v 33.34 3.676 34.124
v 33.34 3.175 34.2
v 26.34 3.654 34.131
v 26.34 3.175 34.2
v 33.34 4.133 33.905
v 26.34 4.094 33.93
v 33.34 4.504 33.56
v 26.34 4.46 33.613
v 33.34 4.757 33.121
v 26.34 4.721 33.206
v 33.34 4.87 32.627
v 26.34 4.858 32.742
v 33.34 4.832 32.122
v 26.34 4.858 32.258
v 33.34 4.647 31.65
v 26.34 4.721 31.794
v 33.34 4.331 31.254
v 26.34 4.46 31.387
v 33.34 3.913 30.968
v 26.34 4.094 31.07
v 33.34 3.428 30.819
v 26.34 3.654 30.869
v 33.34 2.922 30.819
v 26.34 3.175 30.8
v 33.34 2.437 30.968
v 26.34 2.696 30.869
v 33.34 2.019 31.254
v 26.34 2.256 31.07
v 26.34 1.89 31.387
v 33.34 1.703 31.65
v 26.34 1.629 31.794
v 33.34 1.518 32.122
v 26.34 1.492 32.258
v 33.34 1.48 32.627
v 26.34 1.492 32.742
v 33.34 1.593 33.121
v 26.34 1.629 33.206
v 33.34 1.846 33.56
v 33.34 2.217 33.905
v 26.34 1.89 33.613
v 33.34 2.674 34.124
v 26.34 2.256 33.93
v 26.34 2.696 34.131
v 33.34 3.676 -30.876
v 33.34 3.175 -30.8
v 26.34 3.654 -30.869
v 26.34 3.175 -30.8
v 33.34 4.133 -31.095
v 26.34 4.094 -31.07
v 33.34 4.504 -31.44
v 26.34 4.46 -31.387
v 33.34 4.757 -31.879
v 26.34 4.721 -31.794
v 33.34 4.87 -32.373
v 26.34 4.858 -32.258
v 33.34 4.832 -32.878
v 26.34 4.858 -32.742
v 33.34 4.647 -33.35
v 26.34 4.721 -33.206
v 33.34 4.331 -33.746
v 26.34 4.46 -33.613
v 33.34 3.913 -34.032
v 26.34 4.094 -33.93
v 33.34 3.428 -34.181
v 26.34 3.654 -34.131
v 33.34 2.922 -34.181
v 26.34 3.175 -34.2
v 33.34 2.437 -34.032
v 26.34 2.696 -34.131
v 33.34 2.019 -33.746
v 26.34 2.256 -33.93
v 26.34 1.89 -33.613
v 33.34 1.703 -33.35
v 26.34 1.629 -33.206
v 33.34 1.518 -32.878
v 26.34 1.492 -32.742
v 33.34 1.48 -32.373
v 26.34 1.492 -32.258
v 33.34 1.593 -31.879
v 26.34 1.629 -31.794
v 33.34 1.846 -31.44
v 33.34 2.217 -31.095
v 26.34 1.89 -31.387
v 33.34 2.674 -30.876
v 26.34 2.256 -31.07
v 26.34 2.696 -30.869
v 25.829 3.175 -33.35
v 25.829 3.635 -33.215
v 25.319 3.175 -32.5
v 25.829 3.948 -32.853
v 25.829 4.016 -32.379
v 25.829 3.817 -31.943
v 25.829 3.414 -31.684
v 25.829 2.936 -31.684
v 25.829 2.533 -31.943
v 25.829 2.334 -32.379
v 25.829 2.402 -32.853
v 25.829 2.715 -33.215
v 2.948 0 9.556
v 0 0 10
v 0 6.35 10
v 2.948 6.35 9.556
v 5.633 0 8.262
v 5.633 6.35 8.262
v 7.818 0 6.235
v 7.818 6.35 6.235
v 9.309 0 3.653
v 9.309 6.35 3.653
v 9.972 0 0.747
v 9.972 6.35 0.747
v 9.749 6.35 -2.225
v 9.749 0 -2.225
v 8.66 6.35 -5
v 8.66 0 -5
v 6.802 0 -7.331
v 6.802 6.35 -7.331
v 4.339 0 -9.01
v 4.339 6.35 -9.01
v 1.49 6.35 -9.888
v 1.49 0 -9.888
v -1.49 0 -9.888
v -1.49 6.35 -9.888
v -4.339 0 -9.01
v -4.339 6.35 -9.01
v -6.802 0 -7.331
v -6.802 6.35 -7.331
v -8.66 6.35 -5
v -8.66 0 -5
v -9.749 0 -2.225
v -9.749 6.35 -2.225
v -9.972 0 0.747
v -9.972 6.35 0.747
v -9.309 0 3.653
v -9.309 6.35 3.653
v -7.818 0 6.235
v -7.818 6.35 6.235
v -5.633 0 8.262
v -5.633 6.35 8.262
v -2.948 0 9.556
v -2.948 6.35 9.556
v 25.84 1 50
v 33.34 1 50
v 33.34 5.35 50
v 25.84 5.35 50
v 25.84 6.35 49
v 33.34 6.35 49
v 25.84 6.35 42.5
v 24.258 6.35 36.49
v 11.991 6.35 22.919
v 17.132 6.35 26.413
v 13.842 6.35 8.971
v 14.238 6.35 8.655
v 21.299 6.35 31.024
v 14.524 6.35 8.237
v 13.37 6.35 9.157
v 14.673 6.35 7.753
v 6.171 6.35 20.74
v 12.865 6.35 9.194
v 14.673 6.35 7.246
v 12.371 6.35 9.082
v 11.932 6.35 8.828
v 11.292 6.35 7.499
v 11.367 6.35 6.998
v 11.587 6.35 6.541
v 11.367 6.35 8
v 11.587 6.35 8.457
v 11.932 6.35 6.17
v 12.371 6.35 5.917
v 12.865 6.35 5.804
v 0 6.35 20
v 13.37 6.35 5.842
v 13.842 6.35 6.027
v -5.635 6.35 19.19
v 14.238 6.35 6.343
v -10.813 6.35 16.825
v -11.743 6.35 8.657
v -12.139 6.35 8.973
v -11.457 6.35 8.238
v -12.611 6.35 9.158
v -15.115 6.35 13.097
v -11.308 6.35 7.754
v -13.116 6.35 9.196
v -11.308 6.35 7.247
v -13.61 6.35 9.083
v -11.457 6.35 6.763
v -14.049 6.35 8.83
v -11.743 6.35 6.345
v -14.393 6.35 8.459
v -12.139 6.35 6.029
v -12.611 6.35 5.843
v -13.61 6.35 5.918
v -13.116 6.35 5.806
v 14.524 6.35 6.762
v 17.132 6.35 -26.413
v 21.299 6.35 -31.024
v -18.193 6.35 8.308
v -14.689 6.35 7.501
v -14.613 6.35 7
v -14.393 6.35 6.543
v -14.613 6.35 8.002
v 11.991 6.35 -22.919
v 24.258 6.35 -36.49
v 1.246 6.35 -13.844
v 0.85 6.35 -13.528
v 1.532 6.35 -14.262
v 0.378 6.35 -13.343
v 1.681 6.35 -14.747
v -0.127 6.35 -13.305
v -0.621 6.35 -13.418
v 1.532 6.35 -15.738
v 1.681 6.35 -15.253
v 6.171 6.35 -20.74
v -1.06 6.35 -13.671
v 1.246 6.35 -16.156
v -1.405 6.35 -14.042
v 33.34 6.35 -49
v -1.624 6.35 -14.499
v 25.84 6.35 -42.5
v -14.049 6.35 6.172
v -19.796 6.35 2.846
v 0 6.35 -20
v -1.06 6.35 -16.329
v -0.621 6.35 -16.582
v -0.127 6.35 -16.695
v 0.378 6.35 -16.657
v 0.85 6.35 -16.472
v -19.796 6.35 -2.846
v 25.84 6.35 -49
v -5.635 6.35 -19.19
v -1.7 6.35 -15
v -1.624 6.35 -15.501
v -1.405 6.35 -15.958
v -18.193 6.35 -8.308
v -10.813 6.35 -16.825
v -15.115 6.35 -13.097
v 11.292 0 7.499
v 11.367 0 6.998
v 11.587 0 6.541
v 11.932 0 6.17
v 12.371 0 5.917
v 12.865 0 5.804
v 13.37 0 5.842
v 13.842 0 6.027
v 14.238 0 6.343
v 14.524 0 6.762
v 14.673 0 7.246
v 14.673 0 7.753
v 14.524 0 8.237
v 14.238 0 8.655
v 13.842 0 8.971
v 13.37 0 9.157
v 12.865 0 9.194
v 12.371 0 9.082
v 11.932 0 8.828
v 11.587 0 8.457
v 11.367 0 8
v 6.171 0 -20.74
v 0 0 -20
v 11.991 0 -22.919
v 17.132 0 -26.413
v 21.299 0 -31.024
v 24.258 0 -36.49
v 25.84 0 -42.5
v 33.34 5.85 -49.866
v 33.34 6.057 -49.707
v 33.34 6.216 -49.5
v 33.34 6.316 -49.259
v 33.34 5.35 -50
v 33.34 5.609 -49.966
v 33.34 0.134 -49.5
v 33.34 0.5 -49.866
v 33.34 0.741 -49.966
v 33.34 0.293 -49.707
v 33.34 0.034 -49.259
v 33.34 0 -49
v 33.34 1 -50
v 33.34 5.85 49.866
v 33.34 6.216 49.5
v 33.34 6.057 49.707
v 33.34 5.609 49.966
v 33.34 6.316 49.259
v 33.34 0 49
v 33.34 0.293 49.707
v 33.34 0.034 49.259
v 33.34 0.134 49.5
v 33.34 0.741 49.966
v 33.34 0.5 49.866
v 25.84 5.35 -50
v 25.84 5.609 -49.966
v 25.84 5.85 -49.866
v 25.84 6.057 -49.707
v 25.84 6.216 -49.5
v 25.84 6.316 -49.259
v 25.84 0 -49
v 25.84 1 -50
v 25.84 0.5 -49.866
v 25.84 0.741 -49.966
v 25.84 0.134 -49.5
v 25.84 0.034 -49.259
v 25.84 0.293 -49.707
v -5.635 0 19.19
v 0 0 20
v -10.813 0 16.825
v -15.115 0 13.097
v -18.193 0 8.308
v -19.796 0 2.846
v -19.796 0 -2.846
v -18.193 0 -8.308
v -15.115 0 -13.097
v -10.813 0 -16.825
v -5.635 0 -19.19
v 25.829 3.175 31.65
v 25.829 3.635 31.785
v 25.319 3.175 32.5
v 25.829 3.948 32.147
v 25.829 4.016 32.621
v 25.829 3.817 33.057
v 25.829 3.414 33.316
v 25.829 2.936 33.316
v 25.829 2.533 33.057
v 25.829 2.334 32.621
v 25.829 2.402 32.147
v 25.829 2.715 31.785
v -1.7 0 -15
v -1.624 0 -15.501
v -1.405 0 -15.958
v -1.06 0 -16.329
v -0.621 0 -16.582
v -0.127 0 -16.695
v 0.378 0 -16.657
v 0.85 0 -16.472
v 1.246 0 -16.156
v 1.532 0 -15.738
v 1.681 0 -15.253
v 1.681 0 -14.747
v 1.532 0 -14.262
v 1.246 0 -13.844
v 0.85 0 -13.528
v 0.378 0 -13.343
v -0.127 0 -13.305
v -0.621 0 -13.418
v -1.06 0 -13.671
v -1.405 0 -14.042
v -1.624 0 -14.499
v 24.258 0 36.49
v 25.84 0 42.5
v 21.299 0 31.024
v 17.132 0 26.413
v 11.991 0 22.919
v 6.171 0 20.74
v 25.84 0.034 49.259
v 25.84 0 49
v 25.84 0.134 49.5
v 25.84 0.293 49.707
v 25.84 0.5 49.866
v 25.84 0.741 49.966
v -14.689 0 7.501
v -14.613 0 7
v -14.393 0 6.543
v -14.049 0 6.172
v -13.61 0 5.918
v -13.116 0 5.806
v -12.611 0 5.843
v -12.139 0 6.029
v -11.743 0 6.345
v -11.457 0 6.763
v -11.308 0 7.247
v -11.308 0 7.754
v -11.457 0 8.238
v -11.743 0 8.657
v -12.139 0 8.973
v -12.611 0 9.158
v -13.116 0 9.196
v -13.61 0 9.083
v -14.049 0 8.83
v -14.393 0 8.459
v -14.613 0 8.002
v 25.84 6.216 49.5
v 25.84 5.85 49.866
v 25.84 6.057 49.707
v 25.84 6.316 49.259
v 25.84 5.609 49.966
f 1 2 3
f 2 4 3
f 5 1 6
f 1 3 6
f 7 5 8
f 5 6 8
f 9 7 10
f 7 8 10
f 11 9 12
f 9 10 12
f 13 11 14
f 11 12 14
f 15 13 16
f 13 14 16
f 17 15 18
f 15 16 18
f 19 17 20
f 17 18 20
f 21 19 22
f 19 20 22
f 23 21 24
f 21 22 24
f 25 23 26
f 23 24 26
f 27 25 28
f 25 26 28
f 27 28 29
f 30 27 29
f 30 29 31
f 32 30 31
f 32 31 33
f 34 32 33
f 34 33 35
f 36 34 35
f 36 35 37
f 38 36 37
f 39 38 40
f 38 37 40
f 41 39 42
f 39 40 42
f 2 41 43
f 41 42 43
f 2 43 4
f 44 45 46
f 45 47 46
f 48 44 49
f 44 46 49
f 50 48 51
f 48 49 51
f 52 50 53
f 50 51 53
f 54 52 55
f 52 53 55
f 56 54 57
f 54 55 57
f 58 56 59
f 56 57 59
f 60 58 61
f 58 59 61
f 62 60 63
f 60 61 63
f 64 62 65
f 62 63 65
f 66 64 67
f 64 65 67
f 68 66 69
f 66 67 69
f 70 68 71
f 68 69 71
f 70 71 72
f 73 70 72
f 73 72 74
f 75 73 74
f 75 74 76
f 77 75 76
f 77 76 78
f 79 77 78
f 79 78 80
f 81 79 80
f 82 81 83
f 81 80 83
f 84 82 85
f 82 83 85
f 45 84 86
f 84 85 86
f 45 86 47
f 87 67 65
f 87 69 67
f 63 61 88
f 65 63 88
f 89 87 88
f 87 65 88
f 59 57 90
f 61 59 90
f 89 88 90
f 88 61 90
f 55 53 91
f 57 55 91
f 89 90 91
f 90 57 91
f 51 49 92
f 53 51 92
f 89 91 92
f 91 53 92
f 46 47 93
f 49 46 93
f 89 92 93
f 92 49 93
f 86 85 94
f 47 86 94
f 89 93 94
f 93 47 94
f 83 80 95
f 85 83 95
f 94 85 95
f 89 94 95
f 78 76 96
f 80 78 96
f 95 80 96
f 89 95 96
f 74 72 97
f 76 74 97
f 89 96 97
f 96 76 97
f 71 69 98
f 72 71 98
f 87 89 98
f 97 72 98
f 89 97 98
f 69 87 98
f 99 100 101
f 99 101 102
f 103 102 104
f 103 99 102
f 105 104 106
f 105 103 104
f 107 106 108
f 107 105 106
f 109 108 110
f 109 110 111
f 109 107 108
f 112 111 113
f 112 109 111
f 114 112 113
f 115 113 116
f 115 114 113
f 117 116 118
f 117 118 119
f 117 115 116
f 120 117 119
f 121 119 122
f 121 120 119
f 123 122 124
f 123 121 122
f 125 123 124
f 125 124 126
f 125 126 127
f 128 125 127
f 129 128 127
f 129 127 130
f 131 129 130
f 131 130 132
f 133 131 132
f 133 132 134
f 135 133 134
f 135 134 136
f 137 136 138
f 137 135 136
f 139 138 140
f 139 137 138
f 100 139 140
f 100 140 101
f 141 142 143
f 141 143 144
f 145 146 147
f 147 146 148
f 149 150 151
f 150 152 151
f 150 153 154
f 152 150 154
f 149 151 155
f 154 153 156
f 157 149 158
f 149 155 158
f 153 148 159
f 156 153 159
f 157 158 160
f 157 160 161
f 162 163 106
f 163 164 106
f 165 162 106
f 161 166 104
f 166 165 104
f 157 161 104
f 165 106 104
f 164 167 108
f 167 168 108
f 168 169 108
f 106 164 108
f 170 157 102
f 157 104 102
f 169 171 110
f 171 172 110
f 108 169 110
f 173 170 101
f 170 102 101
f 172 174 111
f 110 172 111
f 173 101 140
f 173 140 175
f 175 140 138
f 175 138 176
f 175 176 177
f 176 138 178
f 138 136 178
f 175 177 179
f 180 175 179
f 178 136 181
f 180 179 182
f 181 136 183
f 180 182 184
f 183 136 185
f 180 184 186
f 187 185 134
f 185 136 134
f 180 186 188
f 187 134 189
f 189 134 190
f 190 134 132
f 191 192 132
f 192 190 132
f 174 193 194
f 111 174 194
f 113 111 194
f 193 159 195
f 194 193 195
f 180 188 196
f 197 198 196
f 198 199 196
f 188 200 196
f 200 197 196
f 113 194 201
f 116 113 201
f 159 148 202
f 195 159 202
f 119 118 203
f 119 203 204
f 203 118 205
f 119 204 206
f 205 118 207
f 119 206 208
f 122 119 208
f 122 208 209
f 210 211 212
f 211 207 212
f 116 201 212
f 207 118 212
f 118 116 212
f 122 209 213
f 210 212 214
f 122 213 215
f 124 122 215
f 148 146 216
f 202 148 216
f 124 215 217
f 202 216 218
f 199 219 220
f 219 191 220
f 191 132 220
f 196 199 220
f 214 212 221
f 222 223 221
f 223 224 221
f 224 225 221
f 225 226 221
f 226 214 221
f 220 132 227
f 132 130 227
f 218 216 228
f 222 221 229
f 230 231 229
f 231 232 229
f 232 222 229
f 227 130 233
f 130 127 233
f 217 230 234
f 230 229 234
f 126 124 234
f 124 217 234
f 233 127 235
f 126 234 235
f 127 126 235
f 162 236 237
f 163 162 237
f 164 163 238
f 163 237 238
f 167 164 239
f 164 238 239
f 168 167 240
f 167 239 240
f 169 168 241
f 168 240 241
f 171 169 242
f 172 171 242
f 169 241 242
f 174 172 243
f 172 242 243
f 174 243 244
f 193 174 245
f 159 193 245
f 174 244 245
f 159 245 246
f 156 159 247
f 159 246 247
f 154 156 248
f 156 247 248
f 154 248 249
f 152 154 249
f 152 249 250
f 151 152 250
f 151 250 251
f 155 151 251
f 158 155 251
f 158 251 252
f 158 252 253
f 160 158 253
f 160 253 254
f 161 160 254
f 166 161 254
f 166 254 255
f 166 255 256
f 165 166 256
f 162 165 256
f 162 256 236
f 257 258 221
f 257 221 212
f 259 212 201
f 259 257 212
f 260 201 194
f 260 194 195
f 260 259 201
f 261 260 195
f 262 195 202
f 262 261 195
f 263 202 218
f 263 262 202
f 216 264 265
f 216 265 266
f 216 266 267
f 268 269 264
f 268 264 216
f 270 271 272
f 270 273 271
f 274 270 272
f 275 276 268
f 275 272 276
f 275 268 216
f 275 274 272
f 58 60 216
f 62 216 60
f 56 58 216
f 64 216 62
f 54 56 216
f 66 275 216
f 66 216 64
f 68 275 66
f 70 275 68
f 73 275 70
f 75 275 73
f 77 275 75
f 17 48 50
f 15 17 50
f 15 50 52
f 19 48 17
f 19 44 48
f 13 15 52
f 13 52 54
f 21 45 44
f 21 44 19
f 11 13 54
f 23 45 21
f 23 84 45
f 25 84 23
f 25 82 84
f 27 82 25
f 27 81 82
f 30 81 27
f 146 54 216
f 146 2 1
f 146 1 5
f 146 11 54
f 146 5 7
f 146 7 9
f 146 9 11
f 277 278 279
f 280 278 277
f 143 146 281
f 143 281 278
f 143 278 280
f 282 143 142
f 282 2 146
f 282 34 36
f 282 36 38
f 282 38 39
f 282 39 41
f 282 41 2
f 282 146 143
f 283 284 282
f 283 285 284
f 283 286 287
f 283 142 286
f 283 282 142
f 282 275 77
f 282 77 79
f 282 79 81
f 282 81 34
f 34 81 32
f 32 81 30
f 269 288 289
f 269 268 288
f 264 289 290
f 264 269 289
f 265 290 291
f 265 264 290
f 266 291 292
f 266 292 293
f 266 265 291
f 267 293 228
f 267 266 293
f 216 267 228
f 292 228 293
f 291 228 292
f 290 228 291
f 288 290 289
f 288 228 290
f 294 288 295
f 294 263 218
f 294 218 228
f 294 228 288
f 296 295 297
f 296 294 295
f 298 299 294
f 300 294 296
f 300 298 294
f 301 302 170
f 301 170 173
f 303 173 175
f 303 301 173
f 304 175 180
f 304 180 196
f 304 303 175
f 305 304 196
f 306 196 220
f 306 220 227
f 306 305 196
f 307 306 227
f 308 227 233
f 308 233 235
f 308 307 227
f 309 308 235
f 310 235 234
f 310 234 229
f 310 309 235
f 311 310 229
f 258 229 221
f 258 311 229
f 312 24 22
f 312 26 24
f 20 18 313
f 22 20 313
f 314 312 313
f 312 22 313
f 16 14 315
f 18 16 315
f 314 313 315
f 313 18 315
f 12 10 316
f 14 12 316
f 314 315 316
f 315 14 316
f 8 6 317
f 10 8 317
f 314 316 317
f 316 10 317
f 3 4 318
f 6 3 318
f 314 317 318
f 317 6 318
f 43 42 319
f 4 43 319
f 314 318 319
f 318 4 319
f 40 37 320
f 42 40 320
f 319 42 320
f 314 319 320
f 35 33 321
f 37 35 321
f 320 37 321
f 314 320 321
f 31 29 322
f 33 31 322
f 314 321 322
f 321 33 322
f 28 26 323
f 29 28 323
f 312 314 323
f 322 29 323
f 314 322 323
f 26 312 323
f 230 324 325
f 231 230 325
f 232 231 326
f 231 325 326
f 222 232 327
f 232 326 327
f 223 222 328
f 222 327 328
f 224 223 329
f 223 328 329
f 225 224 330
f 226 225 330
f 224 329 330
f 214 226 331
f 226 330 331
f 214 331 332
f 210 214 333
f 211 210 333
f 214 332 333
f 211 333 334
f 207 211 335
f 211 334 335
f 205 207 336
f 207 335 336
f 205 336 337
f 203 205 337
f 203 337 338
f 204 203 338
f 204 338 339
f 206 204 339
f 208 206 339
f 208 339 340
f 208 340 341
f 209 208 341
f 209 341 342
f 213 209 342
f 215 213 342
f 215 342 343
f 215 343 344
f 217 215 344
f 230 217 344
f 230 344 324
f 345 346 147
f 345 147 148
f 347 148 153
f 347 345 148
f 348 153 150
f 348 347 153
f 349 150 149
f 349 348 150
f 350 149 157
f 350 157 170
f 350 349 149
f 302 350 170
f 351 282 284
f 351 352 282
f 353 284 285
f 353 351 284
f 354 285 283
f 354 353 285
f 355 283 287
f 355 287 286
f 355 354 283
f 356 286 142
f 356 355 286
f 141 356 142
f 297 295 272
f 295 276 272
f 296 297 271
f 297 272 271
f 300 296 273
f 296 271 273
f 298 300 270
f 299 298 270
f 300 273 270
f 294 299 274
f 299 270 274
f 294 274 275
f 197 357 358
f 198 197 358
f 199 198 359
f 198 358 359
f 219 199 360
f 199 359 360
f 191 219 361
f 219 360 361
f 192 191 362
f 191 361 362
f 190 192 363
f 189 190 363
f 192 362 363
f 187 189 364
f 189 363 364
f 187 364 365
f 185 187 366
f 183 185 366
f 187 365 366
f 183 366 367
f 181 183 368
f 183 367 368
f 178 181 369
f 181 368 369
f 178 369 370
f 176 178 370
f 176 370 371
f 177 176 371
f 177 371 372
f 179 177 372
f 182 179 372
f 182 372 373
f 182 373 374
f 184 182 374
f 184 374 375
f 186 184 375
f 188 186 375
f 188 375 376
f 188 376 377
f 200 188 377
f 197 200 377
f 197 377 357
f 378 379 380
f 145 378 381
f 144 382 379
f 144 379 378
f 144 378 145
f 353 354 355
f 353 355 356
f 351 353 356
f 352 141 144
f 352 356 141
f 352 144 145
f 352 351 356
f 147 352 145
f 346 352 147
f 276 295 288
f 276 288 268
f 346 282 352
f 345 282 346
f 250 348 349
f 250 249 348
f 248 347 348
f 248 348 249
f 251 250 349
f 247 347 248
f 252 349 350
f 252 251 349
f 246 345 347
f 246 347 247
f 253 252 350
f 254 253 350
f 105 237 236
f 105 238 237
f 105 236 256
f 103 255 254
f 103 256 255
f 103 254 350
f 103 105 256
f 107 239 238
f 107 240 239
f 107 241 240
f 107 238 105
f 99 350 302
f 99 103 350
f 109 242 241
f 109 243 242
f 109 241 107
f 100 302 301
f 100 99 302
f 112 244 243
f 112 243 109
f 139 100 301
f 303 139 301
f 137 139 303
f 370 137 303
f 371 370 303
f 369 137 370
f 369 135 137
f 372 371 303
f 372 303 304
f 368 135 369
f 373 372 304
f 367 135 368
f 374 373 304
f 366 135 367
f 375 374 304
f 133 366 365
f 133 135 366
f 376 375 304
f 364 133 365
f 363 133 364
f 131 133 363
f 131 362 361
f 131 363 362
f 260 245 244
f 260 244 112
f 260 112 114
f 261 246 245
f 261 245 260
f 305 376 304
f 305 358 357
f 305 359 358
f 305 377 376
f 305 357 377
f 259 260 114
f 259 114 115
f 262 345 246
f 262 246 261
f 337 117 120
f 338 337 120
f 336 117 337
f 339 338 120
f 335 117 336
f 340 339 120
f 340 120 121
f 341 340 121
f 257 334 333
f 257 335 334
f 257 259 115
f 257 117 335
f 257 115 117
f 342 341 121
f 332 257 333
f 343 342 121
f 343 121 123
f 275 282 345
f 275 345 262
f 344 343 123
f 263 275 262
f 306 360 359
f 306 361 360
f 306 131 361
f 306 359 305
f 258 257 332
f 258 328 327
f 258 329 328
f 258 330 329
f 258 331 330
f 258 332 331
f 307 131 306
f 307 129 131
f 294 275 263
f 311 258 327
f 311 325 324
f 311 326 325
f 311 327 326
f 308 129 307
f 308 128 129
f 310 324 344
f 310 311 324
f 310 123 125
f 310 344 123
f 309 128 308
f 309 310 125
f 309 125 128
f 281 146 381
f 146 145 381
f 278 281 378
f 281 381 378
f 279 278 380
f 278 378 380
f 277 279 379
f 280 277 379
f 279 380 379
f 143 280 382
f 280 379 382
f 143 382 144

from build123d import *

# Parameters (mm, degrees)
SKETCH1_R                = 10
BOSS_EXTRUDE1_DEPTH      = 6.35
M3_CLEARANCE_HOLE1_D     = 3.4
M3_CLEARANCE_HOLE3_D     = 3.4
M3_CLEARANCE_HOLE3_DEPTH = 7
M3_CLEARANCE_HOLE3_TIP   = 1.021463052
FILLET1_R                = 1


with BuildPart() as part:
    # Sketch1 → Boss-Extrude1 (new body)
    with BuildSketch(Plane(origin=(0, 0, 0), x_dir=(1, 0, 0), z_dir=(0, 1, 0))):
        with BuildLine():
            Line((33.34, 50), (33.34, -50))
            Line((33.34, -50), (25.84, -50))
            Line((25.84, -50), (25.84, -42.5))
            ThreePointArc((25.84, -42.5), (17.131517738, -26.413305851), (0, -20))
            ThreePointArc((0, -20), (-20, 0), (0, 20))
            ThreePointArc((0, 20), (17.131517738, 26.413305851), (25.84, 42.5))
            Line((25.84, 42.5), (25.84, 50))
            Line((25.84, 50), (33.34, 50))
        make_face()
        with Locations(Location((0, 0, 0), (0, 0, 270))):
            Circle(SKETCH1_R, mode=Mode.SUBTRACT)
    extrude(amount=BOSS_EXTRUDE1_DEPTH)

    # M3 Clearance Hole1 (through all)
    with Locations(Plane(origin=(0, 6.35, 0), x_dir=(1, 0, 0), z_dir=(0, 1, 0))):
        with Locations((0, 15), (12.991881057, -7.499133975), (-12.988881057, -7.500866025), (0.001, 0)):
            Hole(M3_CLEARANCE_HOLE1_D / 2)

    # M3 Clearance Hole3
    with Locations(Plane(origin=(33.34, 0, 0), x_dir=(0, 0, -1), z_dir=(1, 0, 0))):
        with Locations((32.5, 3.175), (-32.5, 3.175)):
            Hole(M3_CLEARANCE_HOLE3_D / 2, depth=M3_CLEARANCE_HOLE3_DEPTH)
            with Locations((0, 0, -(M3_CLEARANCE_HOLE3_DEPTH + M3_CLEARANCE_HOLE3_TIP / 2))):  # 118° drill point
                Cone(0, M3_CLEARANCE_HOLE3_D / 2, M3_CLEARANCE_HOLE3_TIP, mode=Mode.SUBTRACT)

    # Fillet1
    fillet1_edges = [part.edges().sort_by_distance(p)[0] for p in [
        (29.59, 6.35, 50),
        (29.59, 6.35, -50),
        (29.59, 0, -50),
        (29.59, 0, 50),
    ]]
    fillet(fillet1_edges, radius=FILLET1_R)


solid = part.part
